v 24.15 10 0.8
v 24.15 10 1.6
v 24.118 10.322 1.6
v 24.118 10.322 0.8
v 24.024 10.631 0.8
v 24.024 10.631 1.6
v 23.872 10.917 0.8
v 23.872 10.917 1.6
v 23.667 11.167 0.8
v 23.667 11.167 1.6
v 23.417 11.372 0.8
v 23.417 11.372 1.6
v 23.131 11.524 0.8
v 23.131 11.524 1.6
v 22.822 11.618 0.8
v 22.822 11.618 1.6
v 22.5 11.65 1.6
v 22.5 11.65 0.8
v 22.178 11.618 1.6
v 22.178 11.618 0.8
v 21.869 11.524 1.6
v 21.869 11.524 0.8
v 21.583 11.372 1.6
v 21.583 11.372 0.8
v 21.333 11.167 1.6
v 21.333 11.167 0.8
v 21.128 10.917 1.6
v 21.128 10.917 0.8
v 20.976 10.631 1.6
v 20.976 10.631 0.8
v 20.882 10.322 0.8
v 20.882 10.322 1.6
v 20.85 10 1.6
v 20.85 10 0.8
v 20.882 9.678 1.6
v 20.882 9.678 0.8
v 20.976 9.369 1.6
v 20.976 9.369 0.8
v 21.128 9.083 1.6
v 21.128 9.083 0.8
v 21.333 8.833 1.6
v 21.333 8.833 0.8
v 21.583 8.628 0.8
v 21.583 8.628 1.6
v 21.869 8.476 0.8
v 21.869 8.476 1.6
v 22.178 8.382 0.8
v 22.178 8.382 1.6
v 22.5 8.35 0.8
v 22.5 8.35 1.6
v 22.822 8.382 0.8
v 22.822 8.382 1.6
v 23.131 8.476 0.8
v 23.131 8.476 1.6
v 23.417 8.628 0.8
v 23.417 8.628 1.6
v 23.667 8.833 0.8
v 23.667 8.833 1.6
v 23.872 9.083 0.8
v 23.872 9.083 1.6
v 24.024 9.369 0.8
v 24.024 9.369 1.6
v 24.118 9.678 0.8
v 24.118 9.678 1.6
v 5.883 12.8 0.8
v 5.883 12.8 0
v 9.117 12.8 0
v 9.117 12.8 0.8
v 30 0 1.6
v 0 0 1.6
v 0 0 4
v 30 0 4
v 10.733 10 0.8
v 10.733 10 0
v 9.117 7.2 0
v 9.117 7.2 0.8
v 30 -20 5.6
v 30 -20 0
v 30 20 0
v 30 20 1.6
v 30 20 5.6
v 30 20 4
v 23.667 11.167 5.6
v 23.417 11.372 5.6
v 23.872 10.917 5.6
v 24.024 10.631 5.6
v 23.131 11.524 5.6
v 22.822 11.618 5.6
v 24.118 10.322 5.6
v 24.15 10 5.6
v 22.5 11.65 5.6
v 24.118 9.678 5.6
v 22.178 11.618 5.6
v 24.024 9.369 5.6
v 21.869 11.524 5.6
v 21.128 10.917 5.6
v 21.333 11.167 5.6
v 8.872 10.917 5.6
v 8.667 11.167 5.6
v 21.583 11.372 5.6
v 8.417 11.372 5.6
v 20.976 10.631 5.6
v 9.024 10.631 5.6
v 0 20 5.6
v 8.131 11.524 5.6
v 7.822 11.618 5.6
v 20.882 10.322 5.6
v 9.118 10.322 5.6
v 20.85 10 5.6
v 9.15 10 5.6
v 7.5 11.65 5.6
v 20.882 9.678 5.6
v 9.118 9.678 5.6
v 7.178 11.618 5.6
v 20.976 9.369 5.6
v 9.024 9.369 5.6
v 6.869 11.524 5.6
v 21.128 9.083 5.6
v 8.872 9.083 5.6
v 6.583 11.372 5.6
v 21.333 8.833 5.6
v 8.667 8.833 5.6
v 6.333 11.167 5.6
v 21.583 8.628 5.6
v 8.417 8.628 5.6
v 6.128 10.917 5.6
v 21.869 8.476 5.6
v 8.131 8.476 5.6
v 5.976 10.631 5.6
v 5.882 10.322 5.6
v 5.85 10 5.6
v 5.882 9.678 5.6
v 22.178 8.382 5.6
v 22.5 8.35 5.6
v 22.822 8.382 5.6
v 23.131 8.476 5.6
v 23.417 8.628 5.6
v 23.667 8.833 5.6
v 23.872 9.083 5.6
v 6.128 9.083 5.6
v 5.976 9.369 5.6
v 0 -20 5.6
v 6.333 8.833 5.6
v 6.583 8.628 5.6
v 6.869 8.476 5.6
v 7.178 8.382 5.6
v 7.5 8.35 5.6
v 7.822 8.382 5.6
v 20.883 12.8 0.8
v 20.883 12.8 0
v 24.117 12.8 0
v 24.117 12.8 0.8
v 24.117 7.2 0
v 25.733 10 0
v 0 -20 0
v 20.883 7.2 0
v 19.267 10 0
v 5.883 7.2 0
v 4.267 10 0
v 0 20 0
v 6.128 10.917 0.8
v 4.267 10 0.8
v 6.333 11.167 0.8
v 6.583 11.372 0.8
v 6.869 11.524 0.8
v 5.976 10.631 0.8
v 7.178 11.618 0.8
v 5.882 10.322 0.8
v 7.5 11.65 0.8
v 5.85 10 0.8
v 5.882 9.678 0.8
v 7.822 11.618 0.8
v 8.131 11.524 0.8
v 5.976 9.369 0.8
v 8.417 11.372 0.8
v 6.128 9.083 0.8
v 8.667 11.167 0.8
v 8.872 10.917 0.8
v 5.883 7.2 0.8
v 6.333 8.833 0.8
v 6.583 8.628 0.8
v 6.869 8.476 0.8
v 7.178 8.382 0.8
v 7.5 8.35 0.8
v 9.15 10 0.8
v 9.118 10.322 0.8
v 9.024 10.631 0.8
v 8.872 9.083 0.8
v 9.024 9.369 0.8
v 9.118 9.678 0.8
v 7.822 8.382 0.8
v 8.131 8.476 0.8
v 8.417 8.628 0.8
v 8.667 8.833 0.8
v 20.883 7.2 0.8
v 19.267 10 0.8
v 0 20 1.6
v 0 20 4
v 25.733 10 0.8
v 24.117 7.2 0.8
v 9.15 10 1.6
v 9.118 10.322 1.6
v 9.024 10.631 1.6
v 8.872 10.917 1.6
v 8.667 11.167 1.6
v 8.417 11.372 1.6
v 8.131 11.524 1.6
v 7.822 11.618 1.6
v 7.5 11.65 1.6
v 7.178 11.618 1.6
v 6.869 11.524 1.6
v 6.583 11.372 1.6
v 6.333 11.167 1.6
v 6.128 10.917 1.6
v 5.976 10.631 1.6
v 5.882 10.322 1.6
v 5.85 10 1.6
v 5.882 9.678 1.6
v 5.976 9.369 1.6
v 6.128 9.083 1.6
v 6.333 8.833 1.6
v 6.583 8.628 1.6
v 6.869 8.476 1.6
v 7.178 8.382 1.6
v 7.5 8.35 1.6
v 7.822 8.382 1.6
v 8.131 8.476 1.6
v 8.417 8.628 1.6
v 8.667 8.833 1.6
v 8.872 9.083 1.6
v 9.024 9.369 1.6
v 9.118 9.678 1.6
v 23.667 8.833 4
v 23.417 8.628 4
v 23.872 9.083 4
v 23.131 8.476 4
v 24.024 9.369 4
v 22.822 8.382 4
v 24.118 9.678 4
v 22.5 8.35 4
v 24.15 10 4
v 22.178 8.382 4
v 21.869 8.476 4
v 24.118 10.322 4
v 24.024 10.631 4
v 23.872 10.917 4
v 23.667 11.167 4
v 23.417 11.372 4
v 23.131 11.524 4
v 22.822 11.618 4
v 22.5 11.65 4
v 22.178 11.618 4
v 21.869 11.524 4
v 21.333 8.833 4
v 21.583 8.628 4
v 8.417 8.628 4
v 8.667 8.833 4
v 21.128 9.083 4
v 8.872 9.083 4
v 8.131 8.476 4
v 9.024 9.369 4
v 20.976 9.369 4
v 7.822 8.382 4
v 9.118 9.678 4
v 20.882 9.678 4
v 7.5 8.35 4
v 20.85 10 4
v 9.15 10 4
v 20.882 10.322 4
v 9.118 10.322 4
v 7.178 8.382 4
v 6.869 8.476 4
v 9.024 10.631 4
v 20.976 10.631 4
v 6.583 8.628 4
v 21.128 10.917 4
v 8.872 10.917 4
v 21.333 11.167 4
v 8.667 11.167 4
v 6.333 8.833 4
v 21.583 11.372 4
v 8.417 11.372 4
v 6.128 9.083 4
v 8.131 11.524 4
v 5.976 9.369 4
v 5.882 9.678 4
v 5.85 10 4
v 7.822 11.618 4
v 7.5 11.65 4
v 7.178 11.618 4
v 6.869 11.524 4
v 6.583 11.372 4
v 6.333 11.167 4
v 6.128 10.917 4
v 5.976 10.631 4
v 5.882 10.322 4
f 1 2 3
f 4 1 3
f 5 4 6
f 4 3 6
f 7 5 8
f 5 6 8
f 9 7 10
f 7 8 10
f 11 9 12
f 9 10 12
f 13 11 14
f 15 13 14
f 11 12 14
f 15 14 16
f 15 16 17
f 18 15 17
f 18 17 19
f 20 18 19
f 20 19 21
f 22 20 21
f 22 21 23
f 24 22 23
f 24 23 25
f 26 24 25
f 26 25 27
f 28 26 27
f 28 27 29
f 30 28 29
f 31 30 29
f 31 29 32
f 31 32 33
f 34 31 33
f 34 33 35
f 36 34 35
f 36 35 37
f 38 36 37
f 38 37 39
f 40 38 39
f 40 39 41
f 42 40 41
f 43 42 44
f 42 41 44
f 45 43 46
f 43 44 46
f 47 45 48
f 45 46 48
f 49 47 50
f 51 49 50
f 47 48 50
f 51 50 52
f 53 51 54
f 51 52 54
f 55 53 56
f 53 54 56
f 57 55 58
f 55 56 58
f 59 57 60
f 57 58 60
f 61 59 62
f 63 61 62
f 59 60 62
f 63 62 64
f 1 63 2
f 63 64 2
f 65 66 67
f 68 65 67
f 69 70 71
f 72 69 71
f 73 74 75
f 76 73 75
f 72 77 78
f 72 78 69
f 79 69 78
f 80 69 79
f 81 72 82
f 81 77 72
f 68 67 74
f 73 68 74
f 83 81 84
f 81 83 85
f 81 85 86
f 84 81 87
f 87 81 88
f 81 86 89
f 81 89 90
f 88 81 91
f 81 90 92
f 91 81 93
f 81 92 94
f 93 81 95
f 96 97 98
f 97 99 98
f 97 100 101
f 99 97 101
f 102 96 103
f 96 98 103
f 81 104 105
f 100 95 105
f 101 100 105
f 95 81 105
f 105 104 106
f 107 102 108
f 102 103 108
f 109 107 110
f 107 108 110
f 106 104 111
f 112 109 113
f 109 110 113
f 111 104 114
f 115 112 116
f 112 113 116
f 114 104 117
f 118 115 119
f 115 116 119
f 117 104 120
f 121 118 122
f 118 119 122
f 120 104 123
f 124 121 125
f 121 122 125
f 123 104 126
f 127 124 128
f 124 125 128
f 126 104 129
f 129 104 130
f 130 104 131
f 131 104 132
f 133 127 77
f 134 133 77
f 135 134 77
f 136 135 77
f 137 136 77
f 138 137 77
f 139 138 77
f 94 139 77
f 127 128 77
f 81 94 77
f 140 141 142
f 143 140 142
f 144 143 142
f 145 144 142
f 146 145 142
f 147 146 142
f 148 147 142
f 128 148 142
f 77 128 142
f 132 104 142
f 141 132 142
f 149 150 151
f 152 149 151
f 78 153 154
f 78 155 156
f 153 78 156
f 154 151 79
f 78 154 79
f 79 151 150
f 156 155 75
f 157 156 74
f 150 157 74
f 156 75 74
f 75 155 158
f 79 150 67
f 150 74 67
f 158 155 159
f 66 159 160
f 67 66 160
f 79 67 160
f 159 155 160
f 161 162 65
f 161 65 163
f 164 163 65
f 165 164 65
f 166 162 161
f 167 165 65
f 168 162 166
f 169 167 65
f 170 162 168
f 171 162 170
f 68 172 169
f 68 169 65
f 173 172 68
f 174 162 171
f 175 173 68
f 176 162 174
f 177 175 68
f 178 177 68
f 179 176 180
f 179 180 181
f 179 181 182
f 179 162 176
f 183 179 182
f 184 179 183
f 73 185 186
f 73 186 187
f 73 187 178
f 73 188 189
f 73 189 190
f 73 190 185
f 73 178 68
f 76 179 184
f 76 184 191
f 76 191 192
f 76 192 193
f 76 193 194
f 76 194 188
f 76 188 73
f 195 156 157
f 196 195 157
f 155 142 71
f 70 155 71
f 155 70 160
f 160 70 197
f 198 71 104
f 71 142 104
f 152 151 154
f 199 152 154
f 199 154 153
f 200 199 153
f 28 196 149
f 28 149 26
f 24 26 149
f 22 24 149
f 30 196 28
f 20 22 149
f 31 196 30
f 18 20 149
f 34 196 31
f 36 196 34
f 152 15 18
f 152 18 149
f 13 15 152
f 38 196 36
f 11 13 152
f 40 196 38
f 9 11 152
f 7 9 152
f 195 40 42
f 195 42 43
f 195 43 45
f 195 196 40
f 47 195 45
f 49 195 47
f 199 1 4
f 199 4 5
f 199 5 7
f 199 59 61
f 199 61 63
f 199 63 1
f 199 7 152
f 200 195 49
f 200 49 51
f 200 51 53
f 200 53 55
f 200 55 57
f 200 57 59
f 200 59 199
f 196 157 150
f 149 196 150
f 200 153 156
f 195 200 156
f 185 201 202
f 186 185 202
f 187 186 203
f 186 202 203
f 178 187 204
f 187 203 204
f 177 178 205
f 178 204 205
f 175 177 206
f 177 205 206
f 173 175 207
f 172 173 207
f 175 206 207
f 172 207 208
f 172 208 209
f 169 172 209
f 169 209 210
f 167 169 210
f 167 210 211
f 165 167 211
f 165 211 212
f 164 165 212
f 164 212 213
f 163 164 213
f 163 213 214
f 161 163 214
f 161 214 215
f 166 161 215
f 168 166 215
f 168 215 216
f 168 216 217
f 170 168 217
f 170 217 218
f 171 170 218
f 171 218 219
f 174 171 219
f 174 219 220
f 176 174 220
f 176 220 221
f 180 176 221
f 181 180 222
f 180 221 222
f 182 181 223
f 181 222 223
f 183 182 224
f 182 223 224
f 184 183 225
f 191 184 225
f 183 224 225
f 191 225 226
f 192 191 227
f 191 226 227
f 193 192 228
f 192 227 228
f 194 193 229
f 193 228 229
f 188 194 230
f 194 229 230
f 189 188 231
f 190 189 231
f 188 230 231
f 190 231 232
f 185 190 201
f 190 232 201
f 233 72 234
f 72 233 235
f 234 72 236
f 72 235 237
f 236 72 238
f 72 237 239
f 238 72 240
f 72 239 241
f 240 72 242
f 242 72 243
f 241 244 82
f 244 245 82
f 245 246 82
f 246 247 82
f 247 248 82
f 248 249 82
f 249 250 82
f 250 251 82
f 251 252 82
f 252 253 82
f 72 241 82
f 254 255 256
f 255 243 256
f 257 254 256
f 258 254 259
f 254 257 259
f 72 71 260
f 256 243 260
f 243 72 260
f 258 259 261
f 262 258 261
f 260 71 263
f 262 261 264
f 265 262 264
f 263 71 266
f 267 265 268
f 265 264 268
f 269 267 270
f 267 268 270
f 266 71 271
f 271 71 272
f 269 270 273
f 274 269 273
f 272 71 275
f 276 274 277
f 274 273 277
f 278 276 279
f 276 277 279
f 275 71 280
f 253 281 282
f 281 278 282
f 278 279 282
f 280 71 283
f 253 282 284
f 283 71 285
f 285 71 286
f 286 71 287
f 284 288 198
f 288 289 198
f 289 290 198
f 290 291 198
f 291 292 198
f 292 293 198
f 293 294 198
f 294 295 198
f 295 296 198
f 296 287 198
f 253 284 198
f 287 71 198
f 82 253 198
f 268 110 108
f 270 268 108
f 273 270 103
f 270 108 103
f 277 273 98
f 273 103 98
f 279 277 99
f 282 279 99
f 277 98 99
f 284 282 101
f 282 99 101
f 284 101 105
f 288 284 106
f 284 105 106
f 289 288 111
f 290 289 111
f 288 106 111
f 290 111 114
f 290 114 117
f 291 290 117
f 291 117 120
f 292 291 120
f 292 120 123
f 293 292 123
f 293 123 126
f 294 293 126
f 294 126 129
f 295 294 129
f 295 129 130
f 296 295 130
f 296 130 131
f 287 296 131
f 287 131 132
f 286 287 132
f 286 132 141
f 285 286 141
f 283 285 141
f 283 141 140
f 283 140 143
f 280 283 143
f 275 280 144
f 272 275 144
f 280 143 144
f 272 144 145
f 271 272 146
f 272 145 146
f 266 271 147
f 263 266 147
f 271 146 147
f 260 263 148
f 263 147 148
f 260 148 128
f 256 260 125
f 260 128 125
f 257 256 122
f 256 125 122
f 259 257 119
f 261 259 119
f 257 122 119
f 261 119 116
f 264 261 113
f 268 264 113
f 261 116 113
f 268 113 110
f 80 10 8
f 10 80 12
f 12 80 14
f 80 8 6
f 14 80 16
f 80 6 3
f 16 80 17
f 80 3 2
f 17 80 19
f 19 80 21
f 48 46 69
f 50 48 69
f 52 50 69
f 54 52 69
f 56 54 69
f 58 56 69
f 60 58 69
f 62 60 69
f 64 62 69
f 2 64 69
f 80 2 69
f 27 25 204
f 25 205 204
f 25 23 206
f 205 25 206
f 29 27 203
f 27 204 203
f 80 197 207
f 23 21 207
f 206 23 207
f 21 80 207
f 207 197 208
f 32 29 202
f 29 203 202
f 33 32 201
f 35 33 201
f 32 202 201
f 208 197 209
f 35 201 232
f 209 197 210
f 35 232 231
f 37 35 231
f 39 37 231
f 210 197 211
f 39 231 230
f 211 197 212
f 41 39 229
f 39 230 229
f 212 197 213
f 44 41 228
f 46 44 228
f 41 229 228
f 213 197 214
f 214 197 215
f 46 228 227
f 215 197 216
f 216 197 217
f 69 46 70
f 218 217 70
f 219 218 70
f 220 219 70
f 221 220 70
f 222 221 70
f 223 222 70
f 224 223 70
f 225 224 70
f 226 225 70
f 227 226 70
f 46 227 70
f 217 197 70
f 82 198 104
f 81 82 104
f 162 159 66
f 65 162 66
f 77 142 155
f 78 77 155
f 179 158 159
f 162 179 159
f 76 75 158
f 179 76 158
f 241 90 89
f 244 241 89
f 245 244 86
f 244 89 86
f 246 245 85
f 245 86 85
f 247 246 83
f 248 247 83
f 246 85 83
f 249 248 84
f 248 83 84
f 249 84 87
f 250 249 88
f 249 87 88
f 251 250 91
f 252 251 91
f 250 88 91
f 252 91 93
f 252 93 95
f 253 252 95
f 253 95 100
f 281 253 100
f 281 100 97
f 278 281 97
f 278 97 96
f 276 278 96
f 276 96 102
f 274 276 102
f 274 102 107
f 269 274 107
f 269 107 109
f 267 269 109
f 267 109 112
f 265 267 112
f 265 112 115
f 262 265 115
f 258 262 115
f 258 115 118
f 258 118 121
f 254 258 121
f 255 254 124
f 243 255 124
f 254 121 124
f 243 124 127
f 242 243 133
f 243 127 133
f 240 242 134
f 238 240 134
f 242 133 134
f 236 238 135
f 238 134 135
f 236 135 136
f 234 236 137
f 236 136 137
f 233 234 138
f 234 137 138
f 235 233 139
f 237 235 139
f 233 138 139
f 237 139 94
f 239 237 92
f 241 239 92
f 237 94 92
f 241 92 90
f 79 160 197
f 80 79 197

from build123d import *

# Parameters (mm, degrees)
F1_DEPTH = 30
F2_R     = 1.65
F3_DEPTH = 5.6
F5_DEPTH = 0.8


with BuildPart() as f1:
    # F0 (on Right) → F1 (new body)
    with BuildSketch(Plane.YZ):
        Polygon((-20, 5.6), (-20, 0), (20, 0), (20, 1.6), (0, 1.6), (0, 4), (20, 4), (20, 5.6), align=None)
    extrude(amount=F1_DEPTH)

    # F2 (on face) → F3 (cut, through all)
    with BuildSketch(Plane.XY.offset(5.6)):
        with Locations((7.5, 10)):
            Circle(F2_R)
        with Locations((22.5, 10)):
            Circle(F2_R)
    extrude(amount=-F3_DEPTH, mode=Mode.SUBTRACT)

    # F4 (on face) → F5 (cut)
    with BuildSketch(Plane(origin=(0, 0, 0), x_dir=(1, 0, 0), z_dir=(0, 0, -1))):
        Polygon((25.733162, -10), (24.116581, -7.2), (20.883419, -7.2), (19.266838, -10), (20.883419, -12.8), (24.116581, -12.8), align=None)
        Polygon((10.733162, -10), (9.116581, -7.2), (5.883419, -7.2), (4.266838, -10), (5.883419, -12.8), (9.116581, -12.8), align=None)
    extrude(amount=-F5_DEPTH, mode=Mode.SUBTRACT)


solid = f1.part
